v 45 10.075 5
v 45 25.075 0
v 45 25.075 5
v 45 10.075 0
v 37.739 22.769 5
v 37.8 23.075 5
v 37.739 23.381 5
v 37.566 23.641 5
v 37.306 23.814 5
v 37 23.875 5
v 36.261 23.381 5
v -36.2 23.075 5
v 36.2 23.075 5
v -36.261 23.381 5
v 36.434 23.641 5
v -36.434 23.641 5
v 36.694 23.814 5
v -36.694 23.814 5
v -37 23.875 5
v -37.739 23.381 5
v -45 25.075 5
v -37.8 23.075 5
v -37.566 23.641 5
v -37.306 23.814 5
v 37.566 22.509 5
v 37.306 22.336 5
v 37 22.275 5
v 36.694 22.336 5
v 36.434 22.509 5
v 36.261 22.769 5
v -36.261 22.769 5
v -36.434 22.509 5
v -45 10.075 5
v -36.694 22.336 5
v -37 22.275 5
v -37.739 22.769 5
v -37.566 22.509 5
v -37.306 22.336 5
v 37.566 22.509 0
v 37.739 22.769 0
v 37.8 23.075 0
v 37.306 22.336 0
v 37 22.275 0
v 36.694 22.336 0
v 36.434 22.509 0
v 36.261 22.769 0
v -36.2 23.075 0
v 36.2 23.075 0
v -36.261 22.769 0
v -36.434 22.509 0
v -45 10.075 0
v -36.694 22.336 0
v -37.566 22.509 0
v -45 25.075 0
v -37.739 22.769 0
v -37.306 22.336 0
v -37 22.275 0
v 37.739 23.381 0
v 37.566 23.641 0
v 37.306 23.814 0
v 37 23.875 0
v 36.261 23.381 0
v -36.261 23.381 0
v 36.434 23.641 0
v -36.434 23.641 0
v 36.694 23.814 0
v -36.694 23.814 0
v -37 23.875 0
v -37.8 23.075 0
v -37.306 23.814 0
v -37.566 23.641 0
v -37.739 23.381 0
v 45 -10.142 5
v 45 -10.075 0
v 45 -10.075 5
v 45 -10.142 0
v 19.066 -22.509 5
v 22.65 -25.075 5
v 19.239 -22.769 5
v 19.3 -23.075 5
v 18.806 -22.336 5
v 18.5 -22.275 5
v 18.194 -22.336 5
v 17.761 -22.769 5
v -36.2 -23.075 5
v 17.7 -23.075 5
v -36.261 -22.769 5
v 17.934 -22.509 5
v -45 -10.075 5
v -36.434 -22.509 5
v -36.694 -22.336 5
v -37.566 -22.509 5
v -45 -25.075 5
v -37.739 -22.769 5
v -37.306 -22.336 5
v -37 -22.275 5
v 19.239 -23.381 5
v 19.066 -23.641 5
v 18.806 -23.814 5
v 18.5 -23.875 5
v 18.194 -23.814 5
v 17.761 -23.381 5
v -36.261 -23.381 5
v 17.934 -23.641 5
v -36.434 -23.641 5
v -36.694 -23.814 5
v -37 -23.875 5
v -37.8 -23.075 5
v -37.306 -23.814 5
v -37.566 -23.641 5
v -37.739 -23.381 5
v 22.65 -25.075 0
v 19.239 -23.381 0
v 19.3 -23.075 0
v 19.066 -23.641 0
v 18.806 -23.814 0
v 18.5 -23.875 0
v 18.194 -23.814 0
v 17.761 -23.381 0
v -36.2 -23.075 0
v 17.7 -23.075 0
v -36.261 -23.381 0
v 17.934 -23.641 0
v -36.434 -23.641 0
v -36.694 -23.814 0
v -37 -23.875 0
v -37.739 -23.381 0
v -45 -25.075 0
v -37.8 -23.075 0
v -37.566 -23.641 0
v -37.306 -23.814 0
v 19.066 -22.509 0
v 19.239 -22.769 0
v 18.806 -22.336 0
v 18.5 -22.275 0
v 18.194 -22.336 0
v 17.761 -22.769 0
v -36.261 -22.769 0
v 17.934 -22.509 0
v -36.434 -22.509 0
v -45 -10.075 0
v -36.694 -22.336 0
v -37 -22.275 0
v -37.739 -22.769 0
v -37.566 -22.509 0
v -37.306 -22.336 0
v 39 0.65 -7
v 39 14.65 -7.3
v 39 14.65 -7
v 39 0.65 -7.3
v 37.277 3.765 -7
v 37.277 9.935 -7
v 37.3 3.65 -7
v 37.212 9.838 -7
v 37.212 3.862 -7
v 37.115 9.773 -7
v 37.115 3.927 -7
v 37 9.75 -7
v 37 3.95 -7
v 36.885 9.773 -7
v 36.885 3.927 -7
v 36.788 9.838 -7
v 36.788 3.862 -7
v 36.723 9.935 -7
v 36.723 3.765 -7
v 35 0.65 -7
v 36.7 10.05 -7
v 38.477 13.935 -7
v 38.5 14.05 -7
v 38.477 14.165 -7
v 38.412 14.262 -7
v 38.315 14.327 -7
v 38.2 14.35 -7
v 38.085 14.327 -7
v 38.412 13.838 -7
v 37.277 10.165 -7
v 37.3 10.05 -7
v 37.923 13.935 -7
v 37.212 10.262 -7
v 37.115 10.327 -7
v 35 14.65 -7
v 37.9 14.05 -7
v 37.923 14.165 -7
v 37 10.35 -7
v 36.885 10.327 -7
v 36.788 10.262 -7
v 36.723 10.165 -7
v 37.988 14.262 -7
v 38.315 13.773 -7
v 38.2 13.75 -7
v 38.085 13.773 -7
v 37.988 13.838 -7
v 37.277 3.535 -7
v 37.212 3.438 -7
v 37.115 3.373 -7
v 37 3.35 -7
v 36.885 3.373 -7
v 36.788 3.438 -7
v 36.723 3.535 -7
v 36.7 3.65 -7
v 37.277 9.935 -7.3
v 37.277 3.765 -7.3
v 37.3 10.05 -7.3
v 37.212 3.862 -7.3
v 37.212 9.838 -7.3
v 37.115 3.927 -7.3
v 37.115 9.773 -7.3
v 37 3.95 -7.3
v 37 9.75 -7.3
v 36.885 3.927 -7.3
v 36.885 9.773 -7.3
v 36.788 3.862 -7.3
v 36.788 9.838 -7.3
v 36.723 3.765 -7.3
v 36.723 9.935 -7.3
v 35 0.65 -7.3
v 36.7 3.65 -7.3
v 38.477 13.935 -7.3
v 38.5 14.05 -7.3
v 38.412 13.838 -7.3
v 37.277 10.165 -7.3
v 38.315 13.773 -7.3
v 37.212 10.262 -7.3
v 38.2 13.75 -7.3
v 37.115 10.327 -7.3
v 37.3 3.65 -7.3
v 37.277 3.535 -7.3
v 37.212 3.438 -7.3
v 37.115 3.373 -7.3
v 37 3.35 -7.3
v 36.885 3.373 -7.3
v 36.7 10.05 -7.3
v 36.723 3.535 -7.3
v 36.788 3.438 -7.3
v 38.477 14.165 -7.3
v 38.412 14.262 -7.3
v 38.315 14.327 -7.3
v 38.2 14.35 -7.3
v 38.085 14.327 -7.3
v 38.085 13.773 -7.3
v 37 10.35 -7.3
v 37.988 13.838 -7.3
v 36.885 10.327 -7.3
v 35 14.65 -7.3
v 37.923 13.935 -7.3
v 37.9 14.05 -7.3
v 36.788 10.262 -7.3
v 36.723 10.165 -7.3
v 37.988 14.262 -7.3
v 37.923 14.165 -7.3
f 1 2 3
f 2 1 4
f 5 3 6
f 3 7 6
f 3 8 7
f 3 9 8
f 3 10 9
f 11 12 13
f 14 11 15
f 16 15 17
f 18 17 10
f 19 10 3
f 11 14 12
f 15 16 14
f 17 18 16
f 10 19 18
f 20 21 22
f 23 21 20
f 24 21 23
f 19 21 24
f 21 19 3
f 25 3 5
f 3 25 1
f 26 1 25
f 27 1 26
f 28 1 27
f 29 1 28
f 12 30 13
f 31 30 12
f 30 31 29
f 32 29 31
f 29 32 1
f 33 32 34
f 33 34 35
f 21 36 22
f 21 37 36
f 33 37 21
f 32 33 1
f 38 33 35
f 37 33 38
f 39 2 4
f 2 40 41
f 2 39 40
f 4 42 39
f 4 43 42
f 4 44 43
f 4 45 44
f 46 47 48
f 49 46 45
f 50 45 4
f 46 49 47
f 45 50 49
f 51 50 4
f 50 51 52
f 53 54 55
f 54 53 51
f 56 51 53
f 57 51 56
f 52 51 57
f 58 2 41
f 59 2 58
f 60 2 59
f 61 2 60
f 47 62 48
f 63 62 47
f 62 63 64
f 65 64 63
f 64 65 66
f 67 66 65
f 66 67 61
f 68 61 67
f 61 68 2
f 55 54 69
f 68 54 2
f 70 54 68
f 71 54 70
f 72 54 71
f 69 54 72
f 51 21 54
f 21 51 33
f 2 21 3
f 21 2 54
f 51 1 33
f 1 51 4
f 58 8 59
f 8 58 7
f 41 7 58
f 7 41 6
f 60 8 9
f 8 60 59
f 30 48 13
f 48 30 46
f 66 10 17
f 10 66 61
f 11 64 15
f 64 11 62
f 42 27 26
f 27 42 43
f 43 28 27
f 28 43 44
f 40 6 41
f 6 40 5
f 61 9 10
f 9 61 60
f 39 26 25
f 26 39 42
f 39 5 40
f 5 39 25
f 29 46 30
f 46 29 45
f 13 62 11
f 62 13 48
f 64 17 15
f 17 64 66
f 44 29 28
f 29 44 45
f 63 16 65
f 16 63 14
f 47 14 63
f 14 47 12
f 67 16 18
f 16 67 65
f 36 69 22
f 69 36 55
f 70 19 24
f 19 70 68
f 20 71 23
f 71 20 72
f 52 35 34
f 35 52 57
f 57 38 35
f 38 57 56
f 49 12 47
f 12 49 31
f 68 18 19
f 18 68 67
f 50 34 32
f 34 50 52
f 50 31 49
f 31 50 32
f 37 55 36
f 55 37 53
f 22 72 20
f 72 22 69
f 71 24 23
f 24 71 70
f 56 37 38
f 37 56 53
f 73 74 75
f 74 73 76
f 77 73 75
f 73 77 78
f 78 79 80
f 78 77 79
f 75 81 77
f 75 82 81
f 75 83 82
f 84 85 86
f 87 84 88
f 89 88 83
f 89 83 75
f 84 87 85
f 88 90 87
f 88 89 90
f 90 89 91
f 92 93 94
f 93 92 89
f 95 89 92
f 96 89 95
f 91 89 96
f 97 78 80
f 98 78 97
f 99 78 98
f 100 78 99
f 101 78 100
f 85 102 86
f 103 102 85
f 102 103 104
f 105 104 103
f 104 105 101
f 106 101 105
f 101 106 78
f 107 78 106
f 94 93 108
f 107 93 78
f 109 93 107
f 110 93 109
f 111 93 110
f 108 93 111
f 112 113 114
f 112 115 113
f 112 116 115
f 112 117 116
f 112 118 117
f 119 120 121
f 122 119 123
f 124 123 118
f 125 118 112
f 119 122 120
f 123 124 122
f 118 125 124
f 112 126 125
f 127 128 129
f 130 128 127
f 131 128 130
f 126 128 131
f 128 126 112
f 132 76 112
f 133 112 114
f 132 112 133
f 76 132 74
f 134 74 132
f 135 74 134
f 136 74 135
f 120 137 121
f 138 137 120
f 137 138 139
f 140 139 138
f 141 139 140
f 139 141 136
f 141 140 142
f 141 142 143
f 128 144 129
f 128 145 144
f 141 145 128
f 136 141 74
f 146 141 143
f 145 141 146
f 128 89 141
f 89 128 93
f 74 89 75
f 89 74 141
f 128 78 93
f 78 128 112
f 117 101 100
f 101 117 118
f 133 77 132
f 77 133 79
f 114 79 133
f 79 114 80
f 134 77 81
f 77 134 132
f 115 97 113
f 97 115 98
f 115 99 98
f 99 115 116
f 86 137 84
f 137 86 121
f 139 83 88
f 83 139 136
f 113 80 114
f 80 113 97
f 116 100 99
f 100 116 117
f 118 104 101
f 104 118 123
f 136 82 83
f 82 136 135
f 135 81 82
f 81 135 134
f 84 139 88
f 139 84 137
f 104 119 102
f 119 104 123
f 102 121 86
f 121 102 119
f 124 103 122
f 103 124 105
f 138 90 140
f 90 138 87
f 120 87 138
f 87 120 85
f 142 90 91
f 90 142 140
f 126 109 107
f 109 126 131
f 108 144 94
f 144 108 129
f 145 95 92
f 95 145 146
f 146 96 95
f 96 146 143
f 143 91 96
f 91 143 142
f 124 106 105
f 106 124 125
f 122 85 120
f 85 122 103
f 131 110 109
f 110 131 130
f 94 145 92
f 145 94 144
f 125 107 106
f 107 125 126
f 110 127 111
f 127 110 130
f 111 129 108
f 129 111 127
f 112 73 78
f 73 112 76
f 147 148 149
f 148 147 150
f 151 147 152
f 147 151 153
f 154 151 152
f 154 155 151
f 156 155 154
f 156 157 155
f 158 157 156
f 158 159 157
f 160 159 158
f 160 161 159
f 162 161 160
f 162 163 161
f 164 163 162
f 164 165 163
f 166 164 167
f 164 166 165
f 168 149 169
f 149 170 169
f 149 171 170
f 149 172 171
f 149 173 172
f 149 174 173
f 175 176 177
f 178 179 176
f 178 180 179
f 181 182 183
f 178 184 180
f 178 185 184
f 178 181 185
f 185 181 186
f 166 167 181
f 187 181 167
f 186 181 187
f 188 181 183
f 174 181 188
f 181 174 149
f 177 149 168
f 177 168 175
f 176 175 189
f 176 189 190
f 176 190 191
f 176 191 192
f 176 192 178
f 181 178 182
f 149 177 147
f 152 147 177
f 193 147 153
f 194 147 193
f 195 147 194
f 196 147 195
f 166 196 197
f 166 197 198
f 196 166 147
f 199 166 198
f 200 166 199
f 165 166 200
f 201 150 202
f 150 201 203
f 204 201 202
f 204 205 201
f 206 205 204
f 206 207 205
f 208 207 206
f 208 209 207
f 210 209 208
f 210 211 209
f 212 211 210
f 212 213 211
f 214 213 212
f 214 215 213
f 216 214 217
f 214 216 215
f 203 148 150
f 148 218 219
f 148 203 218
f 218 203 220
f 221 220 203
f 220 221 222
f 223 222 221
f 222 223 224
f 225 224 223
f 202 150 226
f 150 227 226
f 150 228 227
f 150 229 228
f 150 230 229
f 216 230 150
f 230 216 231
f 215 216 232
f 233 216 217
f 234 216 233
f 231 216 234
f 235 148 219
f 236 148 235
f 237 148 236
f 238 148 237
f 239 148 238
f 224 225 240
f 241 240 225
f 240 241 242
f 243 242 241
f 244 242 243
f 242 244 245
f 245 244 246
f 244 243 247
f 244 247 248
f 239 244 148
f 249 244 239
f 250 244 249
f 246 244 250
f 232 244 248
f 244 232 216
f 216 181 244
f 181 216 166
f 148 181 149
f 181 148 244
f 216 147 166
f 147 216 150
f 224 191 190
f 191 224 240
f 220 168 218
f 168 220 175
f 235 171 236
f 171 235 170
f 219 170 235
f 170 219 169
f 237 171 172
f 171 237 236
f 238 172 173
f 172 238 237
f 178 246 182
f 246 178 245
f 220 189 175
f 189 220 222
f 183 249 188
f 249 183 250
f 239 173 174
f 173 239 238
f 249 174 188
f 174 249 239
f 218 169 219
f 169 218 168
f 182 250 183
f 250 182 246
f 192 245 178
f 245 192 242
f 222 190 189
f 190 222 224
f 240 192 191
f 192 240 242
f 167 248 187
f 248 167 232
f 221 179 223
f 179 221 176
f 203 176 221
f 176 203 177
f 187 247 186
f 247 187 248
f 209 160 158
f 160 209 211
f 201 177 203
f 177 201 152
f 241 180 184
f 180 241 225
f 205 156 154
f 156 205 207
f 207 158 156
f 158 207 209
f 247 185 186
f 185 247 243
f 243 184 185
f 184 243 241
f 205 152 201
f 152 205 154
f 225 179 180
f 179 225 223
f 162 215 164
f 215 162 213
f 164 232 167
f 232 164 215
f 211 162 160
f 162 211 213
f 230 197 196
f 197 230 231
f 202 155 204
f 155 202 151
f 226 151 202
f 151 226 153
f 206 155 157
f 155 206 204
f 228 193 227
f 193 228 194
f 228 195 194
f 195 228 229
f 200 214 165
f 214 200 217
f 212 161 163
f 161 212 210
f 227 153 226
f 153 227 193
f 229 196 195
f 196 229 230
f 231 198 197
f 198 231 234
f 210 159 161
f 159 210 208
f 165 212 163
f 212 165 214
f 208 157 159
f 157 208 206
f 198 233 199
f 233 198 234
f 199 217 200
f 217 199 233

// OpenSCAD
// file: hdim.scad
module hdim(x1 = 10, x2 = 20, y = 10, dimline_lenght = 9.0) 
{
    dimline_overlap = 0.5;
    dimline_width = 0.3;
    text_size = 2;
    tmp = 2*dimline_overlap+text_size/2;
    text_pos = dimline_lenght>0 ? tmp : -tmp; 
    dimline_abs = dimline_lenght>0 ? dimline_lenght : -dimline_lenght;
    
    // rotate([0,90,rotation]) 
    color([0,0,0])
    // translate([0,0,hex_length*0.5]) 
    {
        translate([x1,y-dimline_lenght/2,0]) 
            square([dimline_width, 
                dimline_abs + 2*dimline_overlap], 
                center=true, $fs=0.01);
                
        translate([x2,y-dimline_lenght/2,0]) 
            square([dimline_width, 
                dimline_abs + 2*dimline_overlap], 
                center=true, $fs=0.01);

        translate([(x1+x2)/2,y-dimline_lenght,0]) 
            square([x2-x1, 
                dimline_width], 
                center=true, $fs=0.01);
        
        translate([(x1+x2)/2,y-dimline_lenght-text_pos,0]) 
            text(str(x2-x1), size = text_size, 
                halign = "center",valign = "center");
    }
}

hdim();
// main file
use <hdim.scad> 

module shelf(shelf_w = 90, wood_w = 15, wood_t = 5, gap = 0.3, pipe_dx=8, pipe_dy=2, pipe_diam = 1.6,is_bottom_shelf=true, explode=true)
{
    wood_y = wood_w/2+gap/4 + (explode ? 10 : 0);
    translate([0, wood_y, wood_t/2])
        onewood(shelf_w, wood_w, wood_t, gap, pipe_dx, pipe_dy, pipe_diam, false, explode);

    translate([0, -wood_y, wood_t/2])
        onewood(shelf_w, wood_w, wood_t, gap, pipe_dx, pipe_dy, pipe_diam, true, explode);

    brace_z = explode ? -7 : 0;
    if (!is_bottom_shelf)
    {
        translate([shelf_w/4+2, 0, brace_z]) 
        ironbrace(2*wood_w+gap);
        
        translate([-shelf_w/4-2, 0, brace_z]) 
        ironbrace(2*wood_w+gap);
    }
    
    if (is_bottom_shelf)
    {
        brace_w = 4;
        brace_t = 0.3;
        screw_hole_diam = 0.6;
        translate([shelf_w/2-pipe_dx, wood_w+gap/2-3.5/2*brace_w-0.5, -brace_t/2+brace_z]) difference()
        {
            color([0.23,0.12,0.10, 1.0])
            cube([brace_w, 3.5*brace_w, brace_t], center=true);
        
            translate([0.3*brace_w,1.6*brace_w, 0])
            cylinder(h=brace_t+0.5,r=screw_hole_diam/2,center = true, $fn = 16);
            translate([0,0.6*brace_w, 0])
            cylinder(h=brace_t+0.5,r=screw_hole_diam/2,center = true, $fn = 16);
            translate([0,-brace_w, 0])
            cylinder(h=brace_t+0.5,r=screw_hole_diam/2,center = true, $fn = 16);
        }
        
        if (explode) 
        {
            hdim(shelf_w/4, shelf_w/2, -wood_y, 4.0+wood_w/2);
            hdim(-shelf_w/2, shelf_w/2, wood_y+wood_w/2, -9.0); 
            hdim(shelf_w/4-4, shelf_w/2, -wood_y-wood_w/2, 9.0); 
            hdim(-shelf_w/2, -shelf_w/2+pipe_dx, -wood_y-wood_w/2, 6.0); 

            translate([shelf_w/2-pipe_dx, wood_y+wood_w/2-pipe_dy/2, wood_t/2])
            rotate([0,0,90]) hdim(-pipe_dy/2, pipe_dy/2, 0, pipe_dx+6.0); 
        }
    }
}        

module onewood(shelf_w, wood_w, wood_t, gap, pipe_dx, pipe_dy, pipe_diam, is_front, explode)
{
    hole_y = is_front ? -wood_w/2+pipe_dy : wood_w/2-pipe_dy;
    right_hole_x = is_front ? shelf_w/4-pipe_dx/2 : shelf_w/2-pipe_dx;
    difference()
    {
        color([0.75,0.48,0.19, 1.0])
        translate([0,0,0])
        cube([shelf_w, wood_w, wood_t], center=true);
        
        translate([right_hole_x, hole_y,0])
        cylinder(h=wood_t+0.5,r=pipe_diam/2,center = true, $fn = 16);

        translate([-shelf_w/2+pipe_dx, hole_y,0])
        cylinder(h=wood_t+0.5,r=pipe_diam/2,center = true, $fn = 16);
        if (is_front) 
        {
            translate([0,0,-wood_t/2-0.2])
            color([0.51,0.38,0.19, 1.0])
            linear_extrude(wood_t+0.4) 
            polygon(points=[[shelf_w/4, -wood_w/2-0.1],[shelf_w/2+0.1,wood_w/2],[shelf_w/2+0.1,-wood_w/2-0.1],[shelf_w/4, -wood_w/2-0.1]]);
        }
    }
    
    
}   

module ironbrace(shelf_depth)
{
    brace_w = 4;
    brace_t = 0.3;
    brace_d1 = 4;
    brace_d2 = 1;
    n_screw_holes = 4;
    brace_l = shelf_depth - brace_d1 - brace_d2;
    screw_range = brace_l - 3;
    screw_step = screw_range/(n_screw_holes-1);
    first_screw = -screw_range/2;
    screw_hole_diam = 0.6;

    translate([0,(brace_d1-brace_d2)/2,-brace_t/2]) difference()
    {
        color([0.23,0.12,0.10, 1.0])
        cube([brace_w, brace_l, brace_t], center=true);
        
        for (x = [0: n_screw_holes-1]) {
            translate([0,x * screw_step + first_screw, 0])
            cylinder(h=brace_t+0.5,r=screw_hole_diam/2,center = true, $fn = 16);
        }
    }
}

shelf();
